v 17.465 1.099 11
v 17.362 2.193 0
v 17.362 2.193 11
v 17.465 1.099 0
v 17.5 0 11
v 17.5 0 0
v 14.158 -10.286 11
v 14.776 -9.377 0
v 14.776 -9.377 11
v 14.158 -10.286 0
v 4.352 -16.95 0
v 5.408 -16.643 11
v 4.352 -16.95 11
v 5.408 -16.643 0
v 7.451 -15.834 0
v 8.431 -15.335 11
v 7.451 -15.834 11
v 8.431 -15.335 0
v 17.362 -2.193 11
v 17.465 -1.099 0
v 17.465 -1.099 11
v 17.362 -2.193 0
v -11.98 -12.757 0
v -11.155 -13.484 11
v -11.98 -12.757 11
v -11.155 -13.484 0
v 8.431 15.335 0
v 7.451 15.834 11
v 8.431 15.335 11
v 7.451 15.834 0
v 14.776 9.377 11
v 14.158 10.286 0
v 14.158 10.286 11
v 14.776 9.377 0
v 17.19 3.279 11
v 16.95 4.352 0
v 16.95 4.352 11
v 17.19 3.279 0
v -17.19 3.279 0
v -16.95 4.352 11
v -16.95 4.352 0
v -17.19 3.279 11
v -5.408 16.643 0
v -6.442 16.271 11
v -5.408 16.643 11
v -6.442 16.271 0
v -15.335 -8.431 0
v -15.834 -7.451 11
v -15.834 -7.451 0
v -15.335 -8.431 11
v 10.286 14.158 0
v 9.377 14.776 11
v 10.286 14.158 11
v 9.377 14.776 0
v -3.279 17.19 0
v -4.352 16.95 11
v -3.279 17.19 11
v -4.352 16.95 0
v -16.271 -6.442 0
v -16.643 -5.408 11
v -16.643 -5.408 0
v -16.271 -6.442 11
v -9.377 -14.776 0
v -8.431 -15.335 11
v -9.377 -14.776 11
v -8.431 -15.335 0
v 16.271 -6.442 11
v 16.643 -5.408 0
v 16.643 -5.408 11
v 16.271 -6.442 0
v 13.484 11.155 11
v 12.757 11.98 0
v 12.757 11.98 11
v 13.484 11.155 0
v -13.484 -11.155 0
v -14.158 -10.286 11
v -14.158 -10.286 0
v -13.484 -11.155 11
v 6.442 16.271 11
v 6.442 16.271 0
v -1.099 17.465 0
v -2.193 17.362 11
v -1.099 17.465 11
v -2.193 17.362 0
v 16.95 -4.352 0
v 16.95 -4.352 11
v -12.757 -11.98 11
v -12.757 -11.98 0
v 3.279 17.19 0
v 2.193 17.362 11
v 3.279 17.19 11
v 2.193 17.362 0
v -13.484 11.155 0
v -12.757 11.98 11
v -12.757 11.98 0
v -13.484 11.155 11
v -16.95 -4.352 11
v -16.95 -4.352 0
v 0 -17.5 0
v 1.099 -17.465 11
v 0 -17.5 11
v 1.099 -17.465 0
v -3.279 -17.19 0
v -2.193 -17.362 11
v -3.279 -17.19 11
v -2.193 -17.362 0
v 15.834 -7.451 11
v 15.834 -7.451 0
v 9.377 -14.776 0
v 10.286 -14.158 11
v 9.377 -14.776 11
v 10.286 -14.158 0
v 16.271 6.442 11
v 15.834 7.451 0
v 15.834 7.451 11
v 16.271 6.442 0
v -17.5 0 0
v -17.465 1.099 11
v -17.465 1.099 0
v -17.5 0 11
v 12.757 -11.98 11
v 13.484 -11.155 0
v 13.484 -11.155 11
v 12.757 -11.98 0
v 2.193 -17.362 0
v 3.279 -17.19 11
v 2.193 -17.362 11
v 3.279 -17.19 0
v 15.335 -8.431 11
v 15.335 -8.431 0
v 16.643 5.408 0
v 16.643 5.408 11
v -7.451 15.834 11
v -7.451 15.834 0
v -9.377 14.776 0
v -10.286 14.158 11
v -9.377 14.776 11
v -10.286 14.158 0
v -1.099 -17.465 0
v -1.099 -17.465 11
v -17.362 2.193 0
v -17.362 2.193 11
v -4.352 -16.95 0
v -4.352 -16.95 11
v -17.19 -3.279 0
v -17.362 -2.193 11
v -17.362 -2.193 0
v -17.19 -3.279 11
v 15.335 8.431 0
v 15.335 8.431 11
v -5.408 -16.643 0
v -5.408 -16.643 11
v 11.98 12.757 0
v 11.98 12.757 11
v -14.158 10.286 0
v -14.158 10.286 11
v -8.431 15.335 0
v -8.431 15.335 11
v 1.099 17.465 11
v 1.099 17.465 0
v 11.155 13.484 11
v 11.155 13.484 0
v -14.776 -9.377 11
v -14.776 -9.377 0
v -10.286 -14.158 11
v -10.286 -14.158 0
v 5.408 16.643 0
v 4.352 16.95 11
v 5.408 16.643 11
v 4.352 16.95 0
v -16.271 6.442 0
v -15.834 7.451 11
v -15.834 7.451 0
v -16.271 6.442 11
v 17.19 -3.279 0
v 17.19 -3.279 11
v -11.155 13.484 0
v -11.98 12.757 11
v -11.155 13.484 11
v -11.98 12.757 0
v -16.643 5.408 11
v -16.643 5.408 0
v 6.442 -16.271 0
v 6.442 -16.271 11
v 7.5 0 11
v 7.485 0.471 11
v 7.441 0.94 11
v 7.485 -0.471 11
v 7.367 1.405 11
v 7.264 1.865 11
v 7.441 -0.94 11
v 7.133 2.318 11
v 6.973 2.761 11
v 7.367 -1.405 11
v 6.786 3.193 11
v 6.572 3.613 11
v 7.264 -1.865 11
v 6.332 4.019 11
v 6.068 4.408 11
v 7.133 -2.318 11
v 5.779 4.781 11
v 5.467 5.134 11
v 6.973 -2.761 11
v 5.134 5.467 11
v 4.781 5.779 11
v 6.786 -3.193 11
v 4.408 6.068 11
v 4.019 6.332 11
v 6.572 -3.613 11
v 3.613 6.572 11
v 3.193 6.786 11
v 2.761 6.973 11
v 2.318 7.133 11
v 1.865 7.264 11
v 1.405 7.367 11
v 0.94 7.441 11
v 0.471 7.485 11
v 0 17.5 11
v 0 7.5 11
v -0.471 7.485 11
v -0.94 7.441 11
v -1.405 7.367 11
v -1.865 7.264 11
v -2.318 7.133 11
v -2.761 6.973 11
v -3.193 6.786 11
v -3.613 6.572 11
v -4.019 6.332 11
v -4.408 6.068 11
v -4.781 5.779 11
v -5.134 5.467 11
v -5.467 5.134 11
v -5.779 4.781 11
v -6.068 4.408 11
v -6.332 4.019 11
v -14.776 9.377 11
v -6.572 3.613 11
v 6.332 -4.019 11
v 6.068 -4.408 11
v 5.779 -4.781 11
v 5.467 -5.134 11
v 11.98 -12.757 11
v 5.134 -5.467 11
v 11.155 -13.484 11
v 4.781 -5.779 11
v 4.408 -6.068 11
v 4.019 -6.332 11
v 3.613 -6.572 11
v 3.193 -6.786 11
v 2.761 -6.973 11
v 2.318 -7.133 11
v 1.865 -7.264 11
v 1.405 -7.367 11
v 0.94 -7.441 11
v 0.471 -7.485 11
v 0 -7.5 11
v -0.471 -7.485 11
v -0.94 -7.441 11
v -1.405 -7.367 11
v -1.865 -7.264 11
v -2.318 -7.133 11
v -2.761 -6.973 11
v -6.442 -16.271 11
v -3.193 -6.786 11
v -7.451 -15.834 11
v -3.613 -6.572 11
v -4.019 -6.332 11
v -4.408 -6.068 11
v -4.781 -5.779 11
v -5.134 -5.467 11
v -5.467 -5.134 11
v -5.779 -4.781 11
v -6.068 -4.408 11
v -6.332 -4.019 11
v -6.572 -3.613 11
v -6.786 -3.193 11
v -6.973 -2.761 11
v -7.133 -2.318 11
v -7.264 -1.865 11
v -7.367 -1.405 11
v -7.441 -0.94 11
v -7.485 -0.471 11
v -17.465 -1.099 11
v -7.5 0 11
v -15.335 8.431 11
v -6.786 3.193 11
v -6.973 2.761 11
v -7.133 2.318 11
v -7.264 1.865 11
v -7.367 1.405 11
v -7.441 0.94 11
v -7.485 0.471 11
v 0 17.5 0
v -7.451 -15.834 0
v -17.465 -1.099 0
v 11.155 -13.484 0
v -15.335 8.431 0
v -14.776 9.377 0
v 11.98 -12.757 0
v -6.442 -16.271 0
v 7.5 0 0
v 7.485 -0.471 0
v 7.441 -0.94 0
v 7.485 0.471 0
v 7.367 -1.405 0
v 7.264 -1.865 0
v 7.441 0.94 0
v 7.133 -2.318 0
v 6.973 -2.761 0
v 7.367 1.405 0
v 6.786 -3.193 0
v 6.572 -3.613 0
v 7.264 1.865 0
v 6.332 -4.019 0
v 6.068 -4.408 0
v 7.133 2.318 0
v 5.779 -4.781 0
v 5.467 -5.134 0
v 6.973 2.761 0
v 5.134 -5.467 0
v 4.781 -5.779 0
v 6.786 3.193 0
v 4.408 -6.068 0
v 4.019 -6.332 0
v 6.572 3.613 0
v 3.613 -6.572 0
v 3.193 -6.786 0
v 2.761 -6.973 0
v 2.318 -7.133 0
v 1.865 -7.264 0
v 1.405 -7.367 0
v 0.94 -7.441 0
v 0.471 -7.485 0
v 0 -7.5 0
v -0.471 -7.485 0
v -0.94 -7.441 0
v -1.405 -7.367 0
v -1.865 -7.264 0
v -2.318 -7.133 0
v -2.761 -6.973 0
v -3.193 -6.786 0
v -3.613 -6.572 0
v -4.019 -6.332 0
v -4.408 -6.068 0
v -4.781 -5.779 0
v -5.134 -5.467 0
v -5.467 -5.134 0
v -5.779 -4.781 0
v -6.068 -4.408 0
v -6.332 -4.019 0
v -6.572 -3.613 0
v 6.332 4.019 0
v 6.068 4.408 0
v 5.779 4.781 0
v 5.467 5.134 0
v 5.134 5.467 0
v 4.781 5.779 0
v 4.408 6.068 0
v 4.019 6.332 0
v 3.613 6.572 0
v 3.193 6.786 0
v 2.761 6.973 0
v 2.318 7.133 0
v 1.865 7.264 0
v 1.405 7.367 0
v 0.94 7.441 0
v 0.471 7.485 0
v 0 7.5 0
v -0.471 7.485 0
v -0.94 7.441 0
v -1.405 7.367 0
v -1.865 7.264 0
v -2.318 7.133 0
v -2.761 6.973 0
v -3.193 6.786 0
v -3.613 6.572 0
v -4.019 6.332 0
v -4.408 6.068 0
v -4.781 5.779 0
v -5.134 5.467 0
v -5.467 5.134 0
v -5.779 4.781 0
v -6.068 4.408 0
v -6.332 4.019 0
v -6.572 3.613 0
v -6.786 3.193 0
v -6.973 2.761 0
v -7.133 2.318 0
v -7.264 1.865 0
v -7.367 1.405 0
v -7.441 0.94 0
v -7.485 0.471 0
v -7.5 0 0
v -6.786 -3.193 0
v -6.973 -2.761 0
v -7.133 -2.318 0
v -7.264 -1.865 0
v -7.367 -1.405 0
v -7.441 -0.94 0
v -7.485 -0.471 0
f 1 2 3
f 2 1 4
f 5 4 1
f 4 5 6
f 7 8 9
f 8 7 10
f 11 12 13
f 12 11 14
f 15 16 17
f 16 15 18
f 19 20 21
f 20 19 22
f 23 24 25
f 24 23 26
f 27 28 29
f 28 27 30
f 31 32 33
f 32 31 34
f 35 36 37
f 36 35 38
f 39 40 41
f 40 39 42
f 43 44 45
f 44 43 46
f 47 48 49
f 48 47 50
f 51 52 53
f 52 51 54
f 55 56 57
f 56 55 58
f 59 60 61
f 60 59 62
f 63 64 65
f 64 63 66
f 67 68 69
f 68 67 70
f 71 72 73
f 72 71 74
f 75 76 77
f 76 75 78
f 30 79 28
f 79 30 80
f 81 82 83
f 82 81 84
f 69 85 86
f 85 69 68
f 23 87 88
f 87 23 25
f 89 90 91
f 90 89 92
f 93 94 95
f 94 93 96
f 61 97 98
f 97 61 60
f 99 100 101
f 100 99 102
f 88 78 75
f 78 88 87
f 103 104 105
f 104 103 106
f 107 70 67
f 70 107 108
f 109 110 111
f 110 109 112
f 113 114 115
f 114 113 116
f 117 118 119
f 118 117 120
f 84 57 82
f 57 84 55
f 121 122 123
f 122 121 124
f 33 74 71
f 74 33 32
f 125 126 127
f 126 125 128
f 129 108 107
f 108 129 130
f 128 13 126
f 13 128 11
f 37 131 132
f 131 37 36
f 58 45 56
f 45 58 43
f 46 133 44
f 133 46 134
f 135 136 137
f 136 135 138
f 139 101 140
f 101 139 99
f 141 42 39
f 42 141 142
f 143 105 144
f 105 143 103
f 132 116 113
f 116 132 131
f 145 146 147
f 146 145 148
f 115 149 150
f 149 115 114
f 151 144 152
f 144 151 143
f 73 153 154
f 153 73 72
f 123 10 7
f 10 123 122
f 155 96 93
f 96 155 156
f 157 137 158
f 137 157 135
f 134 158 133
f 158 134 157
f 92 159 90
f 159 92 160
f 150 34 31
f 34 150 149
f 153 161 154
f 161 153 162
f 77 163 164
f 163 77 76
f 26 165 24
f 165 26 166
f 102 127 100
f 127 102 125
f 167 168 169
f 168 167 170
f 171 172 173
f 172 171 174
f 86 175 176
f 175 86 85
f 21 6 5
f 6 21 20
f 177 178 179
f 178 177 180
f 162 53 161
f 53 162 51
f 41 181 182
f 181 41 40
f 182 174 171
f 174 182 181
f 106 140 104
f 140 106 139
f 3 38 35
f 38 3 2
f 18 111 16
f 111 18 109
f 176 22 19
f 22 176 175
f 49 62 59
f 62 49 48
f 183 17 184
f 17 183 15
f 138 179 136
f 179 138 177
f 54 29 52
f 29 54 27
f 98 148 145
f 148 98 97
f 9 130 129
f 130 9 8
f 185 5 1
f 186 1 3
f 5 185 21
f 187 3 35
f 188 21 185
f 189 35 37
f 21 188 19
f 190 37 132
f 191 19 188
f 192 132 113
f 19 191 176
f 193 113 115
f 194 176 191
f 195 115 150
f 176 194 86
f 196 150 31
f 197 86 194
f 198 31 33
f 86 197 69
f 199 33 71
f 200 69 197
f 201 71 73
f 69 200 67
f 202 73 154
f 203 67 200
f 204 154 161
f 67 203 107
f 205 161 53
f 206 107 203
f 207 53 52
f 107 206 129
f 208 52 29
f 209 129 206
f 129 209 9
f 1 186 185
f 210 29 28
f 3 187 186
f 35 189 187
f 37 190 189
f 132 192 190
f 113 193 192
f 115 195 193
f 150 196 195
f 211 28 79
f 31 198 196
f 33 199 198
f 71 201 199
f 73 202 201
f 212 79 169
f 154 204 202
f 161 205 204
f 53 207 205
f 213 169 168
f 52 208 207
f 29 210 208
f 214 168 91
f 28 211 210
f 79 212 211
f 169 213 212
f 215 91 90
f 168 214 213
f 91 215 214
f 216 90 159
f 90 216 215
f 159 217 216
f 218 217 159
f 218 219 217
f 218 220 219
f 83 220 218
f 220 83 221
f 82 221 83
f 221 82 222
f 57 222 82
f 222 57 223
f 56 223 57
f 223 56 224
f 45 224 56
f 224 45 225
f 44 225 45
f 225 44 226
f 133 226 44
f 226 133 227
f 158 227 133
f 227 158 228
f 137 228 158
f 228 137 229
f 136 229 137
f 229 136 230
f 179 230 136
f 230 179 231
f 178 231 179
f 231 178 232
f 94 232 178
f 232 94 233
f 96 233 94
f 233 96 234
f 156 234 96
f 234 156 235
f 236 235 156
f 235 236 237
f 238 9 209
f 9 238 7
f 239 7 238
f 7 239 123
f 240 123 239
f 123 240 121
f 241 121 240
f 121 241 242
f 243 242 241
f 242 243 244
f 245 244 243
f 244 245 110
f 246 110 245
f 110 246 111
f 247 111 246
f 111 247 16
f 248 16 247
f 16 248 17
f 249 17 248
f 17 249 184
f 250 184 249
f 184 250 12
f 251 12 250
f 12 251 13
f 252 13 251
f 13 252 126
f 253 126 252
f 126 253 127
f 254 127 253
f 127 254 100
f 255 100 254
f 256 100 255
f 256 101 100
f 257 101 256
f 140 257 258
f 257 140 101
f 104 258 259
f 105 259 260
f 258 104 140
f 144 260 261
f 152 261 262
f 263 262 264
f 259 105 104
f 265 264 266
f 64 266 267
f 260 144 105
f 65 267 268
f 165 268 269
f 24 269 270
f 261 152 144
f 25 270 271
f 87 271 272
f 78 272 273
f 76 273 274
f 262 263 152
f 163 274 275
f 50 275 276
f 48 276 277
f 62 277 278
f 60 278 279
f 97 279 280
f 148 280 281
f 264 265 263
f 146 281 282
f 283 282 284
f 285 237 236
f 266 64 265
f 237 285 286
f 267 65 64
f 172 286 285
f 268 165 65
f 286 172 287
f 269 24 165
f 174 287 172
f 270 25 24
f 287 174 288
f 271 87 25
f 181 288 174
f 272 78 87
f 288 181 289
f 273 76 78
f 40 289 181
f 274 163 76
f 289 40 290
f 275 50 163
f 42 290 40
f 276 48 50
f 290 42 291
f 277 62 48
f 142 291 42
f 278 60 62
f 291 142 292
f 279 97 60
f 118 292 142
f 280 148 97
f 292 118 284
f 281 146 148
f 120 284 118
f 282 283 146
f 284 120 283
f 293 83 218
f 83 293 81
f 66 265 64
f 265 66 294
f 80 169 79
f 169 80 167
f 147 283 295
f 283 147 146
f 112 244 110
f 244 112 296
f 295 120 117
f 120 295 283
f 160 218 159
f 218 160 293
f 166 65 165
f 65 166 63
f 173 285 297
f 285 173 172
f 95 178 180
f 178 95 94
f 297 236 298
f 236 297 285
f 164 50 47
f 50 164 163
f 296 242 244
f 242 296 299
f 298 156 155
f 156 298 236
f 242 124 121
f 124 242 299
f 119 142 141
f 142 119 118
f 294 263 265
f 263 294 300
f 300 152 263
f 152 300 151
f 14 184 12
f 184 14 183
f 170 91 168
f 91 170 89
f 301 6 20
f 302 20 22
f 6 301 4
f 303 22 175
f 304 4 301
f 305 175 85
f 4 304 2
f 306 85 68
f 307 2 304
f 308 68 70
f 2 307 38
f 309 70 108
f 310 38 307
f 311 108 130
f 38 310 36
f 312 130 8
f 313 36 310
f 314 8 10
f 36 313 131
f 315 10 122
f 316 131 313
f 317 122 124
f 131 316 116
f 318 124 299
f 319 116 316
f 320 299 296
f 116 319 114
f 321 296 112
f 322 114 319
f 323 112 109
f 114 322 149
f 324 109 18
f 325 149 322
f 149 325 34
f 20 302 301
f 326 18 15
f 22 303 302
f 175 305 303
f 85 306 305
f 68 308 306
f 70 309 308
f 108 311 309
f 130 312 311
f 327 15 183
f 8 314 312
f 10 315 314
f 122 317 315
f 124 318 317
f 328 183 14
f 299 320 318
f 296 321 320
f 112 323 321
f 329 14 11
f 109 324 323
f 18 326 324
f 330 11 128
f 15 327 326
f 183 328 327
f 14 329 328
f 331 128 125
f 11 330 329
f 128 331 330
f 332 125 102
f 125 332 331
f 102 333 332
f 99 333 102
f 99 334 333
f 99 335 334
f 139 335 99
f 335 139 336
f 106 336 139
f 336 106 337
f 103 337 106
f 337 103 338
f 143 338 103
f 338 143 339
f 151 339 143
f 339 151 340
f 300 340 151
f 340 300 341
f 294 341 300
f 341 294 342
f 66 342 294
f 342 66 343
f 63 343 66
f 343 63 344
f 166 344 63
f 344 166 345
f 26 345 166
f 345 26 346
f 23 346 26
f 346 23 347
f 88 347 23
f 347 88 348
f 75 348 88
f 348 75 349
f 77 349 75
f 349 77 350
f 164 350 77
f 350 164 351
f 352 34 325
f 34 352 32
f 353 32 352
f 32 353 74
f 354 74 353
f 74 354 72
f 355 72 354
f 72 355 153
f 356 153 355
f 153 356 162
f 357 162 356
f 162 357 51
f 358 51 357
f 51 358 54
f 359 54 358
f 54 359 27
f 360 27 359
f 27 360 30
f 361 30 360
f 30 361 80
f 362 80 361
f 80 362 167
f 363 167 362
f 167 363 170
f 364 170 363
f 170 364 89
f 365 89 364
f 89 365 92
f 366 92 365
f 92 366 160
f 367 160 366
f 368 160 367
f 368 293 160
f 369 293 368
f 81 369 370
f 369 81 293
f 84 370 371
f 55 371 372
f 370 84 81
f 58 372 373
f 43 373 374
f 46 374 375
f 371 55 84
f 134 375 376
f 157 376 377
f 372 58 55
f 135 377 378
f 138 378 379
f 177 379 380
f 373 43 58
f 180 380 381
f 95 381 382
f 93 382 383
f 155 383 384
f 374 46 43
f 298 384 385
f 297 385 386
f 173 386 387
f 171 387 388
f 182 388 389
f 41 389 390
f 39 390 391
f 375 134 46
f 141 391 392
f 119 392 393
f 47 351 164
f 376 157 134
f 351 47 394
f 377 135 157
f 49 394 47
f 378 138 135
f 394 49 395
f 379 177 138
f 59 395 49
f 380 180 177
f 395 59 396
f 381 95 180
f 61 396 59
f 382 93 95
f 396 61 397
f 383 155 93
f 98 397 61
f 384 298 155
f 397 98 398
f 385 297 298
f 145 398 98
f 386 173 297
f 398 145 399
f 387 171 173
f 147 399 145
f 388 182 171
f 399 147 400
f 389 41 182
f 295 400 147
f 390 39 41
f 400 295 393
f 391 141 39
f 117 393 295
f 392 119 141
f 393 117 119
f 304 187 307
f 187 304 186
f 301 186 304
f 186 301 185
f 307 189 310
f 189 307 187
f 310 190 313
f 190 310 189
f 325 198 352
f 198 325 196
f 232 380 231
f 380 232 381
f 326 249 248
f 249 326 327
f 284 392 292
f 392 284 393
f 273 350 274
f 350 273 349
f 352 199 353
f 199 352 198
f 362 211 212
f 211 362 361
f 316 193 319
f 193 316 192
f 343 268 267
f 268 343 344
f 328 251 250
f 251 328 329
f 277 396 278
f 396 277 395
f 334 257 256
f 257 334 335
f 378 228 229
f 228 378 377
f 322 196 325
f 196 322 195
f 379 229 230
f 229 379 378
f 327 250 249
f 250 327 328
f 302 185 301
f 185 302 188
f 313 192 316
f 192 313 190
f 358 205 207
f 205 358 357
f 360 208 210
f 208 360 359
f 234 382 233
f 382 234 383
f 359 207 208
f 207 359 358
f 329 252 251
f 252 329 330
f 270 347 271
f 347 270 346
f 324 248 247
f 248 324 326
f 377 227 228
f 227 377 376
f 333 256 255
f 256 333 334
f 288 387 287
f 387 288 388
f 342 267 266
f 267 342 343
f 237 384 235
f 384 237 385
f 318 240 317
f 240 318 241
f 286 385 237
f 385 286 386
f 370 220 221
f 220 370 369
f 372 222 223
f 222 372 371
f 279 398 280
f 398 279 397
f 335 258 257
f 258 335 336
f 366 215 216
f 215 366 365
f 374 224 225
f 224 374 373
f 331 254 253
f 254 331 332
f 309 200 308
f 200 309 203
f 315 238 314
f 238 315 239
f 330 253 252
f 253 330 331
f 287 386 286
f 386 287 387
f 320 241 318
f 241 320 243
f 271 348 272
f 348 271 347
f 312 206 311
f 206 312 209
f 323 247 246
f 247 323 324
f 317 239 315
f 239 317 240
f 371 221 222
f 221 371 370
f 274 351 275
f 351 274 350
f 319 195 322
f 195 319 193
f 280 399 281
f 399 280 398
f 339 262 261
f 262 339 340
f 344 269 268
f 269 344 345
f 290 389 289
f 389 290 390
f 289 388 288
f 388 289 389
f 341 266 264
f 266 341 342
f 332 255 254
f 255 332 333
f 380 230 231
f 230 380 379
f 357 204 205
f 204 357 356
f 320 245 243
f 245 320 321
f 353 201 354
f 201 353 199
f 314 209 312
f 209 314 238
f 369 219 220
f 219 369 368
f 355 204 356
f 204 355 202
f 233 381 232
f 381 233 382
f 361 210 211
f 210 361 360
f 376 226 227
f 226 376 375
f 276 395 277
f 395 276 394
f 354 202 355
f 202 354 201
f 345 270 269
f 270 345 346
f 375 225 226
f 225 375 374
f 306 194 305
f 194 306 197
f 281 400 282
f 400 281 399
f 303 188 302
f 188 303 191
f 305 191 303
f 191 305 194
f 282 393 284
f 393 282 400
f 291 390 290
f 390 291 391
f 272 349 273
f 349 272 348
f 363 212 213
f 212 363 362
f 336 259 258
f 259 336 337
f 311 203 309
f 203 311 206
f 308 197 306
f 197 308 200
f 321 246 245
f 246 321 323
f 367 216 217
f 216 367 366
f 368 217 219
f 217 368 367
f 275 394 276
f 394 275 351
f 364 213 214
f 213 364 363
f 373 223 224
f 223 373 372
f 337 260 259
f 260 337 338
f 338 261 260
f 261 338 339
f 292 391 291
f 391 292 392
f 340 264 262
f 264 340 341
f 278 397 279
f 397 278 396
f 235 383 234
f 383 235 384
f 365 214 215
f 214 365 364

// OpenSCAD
// file: tolerances.scad
// F-Roof: A multi-function single-layer roof
// https://github.com/f-roof
// Author: Mihai Oltean; https://tcreate.org
//---------------------------------------------------------------------------------------
tolerance = 0.1;
display_tolerance = 1;

tolerance_z = [0, 0, tolerance];
tolerance_x = [tolerance, 0, 0];
tolerance_y = [0, tolerance, 0];

display_tolerance_z = [0, 0, display_tolerance];
display_tolerance_x = [display_tolerance, 0, 0];
display_tolerance_y = [0, display_tolerance, 0];
//---------------------------------------------------------------------------------------
// file: bearings_params.scad
// Solar-Bear
// A solar-hybrid trike
// https://github.com/solar-b

// Maker: Mihai Oltean
// https://mihaioltean.github.io
// License: MIT
//--------------------------------------------------------------

tb_51203_external_radius = 17.5;
tb_51203_internal_radius = 8.5;
tb_51203_height = 12;

tb_30202_external_radius = 17.5;
tb_30202_internal_radius = 7.5;
tb_30202_height = 11;
// main file
// Solar-Bear
// A solar-hybrid trike
// https://github.com/solar-b

// Maker: Mihai Oltean
// https://mihaioltean.github.io
// License: MIT
//--------------------------------------------------------------
include <bearings_params.scad>
include <tolerances.scad>
//--------------------------------------------------------------
module bearing_axial(external_radius, internal_radius, height)
{
    difference(){
        color("silver")
        cylinder(h = height, r = external_radius, $fn = 100);
        translate (-display_tolerance_z) cylinder(h = height + 2 * display_tolerance, r = internal_radius, $fn = 100);
    }
}
//--------------------------------------------------------------
module bearing_axial_51203()
{
    bearing_axial(external_radius = tb_51203_external_radius, internal_radius = tb_51203_internal_radius, height = tb_51203_height);
}
//--------------------------------------------------------------
module bearing_conic_30202()
{
    bearing_axial(external_radius = tb_30202_external_radius, internal_radius = tb_30202_internal_radius, height = tb_30202_height);
}
//--------------------------------------------------------------

bearing_conic_30202();
